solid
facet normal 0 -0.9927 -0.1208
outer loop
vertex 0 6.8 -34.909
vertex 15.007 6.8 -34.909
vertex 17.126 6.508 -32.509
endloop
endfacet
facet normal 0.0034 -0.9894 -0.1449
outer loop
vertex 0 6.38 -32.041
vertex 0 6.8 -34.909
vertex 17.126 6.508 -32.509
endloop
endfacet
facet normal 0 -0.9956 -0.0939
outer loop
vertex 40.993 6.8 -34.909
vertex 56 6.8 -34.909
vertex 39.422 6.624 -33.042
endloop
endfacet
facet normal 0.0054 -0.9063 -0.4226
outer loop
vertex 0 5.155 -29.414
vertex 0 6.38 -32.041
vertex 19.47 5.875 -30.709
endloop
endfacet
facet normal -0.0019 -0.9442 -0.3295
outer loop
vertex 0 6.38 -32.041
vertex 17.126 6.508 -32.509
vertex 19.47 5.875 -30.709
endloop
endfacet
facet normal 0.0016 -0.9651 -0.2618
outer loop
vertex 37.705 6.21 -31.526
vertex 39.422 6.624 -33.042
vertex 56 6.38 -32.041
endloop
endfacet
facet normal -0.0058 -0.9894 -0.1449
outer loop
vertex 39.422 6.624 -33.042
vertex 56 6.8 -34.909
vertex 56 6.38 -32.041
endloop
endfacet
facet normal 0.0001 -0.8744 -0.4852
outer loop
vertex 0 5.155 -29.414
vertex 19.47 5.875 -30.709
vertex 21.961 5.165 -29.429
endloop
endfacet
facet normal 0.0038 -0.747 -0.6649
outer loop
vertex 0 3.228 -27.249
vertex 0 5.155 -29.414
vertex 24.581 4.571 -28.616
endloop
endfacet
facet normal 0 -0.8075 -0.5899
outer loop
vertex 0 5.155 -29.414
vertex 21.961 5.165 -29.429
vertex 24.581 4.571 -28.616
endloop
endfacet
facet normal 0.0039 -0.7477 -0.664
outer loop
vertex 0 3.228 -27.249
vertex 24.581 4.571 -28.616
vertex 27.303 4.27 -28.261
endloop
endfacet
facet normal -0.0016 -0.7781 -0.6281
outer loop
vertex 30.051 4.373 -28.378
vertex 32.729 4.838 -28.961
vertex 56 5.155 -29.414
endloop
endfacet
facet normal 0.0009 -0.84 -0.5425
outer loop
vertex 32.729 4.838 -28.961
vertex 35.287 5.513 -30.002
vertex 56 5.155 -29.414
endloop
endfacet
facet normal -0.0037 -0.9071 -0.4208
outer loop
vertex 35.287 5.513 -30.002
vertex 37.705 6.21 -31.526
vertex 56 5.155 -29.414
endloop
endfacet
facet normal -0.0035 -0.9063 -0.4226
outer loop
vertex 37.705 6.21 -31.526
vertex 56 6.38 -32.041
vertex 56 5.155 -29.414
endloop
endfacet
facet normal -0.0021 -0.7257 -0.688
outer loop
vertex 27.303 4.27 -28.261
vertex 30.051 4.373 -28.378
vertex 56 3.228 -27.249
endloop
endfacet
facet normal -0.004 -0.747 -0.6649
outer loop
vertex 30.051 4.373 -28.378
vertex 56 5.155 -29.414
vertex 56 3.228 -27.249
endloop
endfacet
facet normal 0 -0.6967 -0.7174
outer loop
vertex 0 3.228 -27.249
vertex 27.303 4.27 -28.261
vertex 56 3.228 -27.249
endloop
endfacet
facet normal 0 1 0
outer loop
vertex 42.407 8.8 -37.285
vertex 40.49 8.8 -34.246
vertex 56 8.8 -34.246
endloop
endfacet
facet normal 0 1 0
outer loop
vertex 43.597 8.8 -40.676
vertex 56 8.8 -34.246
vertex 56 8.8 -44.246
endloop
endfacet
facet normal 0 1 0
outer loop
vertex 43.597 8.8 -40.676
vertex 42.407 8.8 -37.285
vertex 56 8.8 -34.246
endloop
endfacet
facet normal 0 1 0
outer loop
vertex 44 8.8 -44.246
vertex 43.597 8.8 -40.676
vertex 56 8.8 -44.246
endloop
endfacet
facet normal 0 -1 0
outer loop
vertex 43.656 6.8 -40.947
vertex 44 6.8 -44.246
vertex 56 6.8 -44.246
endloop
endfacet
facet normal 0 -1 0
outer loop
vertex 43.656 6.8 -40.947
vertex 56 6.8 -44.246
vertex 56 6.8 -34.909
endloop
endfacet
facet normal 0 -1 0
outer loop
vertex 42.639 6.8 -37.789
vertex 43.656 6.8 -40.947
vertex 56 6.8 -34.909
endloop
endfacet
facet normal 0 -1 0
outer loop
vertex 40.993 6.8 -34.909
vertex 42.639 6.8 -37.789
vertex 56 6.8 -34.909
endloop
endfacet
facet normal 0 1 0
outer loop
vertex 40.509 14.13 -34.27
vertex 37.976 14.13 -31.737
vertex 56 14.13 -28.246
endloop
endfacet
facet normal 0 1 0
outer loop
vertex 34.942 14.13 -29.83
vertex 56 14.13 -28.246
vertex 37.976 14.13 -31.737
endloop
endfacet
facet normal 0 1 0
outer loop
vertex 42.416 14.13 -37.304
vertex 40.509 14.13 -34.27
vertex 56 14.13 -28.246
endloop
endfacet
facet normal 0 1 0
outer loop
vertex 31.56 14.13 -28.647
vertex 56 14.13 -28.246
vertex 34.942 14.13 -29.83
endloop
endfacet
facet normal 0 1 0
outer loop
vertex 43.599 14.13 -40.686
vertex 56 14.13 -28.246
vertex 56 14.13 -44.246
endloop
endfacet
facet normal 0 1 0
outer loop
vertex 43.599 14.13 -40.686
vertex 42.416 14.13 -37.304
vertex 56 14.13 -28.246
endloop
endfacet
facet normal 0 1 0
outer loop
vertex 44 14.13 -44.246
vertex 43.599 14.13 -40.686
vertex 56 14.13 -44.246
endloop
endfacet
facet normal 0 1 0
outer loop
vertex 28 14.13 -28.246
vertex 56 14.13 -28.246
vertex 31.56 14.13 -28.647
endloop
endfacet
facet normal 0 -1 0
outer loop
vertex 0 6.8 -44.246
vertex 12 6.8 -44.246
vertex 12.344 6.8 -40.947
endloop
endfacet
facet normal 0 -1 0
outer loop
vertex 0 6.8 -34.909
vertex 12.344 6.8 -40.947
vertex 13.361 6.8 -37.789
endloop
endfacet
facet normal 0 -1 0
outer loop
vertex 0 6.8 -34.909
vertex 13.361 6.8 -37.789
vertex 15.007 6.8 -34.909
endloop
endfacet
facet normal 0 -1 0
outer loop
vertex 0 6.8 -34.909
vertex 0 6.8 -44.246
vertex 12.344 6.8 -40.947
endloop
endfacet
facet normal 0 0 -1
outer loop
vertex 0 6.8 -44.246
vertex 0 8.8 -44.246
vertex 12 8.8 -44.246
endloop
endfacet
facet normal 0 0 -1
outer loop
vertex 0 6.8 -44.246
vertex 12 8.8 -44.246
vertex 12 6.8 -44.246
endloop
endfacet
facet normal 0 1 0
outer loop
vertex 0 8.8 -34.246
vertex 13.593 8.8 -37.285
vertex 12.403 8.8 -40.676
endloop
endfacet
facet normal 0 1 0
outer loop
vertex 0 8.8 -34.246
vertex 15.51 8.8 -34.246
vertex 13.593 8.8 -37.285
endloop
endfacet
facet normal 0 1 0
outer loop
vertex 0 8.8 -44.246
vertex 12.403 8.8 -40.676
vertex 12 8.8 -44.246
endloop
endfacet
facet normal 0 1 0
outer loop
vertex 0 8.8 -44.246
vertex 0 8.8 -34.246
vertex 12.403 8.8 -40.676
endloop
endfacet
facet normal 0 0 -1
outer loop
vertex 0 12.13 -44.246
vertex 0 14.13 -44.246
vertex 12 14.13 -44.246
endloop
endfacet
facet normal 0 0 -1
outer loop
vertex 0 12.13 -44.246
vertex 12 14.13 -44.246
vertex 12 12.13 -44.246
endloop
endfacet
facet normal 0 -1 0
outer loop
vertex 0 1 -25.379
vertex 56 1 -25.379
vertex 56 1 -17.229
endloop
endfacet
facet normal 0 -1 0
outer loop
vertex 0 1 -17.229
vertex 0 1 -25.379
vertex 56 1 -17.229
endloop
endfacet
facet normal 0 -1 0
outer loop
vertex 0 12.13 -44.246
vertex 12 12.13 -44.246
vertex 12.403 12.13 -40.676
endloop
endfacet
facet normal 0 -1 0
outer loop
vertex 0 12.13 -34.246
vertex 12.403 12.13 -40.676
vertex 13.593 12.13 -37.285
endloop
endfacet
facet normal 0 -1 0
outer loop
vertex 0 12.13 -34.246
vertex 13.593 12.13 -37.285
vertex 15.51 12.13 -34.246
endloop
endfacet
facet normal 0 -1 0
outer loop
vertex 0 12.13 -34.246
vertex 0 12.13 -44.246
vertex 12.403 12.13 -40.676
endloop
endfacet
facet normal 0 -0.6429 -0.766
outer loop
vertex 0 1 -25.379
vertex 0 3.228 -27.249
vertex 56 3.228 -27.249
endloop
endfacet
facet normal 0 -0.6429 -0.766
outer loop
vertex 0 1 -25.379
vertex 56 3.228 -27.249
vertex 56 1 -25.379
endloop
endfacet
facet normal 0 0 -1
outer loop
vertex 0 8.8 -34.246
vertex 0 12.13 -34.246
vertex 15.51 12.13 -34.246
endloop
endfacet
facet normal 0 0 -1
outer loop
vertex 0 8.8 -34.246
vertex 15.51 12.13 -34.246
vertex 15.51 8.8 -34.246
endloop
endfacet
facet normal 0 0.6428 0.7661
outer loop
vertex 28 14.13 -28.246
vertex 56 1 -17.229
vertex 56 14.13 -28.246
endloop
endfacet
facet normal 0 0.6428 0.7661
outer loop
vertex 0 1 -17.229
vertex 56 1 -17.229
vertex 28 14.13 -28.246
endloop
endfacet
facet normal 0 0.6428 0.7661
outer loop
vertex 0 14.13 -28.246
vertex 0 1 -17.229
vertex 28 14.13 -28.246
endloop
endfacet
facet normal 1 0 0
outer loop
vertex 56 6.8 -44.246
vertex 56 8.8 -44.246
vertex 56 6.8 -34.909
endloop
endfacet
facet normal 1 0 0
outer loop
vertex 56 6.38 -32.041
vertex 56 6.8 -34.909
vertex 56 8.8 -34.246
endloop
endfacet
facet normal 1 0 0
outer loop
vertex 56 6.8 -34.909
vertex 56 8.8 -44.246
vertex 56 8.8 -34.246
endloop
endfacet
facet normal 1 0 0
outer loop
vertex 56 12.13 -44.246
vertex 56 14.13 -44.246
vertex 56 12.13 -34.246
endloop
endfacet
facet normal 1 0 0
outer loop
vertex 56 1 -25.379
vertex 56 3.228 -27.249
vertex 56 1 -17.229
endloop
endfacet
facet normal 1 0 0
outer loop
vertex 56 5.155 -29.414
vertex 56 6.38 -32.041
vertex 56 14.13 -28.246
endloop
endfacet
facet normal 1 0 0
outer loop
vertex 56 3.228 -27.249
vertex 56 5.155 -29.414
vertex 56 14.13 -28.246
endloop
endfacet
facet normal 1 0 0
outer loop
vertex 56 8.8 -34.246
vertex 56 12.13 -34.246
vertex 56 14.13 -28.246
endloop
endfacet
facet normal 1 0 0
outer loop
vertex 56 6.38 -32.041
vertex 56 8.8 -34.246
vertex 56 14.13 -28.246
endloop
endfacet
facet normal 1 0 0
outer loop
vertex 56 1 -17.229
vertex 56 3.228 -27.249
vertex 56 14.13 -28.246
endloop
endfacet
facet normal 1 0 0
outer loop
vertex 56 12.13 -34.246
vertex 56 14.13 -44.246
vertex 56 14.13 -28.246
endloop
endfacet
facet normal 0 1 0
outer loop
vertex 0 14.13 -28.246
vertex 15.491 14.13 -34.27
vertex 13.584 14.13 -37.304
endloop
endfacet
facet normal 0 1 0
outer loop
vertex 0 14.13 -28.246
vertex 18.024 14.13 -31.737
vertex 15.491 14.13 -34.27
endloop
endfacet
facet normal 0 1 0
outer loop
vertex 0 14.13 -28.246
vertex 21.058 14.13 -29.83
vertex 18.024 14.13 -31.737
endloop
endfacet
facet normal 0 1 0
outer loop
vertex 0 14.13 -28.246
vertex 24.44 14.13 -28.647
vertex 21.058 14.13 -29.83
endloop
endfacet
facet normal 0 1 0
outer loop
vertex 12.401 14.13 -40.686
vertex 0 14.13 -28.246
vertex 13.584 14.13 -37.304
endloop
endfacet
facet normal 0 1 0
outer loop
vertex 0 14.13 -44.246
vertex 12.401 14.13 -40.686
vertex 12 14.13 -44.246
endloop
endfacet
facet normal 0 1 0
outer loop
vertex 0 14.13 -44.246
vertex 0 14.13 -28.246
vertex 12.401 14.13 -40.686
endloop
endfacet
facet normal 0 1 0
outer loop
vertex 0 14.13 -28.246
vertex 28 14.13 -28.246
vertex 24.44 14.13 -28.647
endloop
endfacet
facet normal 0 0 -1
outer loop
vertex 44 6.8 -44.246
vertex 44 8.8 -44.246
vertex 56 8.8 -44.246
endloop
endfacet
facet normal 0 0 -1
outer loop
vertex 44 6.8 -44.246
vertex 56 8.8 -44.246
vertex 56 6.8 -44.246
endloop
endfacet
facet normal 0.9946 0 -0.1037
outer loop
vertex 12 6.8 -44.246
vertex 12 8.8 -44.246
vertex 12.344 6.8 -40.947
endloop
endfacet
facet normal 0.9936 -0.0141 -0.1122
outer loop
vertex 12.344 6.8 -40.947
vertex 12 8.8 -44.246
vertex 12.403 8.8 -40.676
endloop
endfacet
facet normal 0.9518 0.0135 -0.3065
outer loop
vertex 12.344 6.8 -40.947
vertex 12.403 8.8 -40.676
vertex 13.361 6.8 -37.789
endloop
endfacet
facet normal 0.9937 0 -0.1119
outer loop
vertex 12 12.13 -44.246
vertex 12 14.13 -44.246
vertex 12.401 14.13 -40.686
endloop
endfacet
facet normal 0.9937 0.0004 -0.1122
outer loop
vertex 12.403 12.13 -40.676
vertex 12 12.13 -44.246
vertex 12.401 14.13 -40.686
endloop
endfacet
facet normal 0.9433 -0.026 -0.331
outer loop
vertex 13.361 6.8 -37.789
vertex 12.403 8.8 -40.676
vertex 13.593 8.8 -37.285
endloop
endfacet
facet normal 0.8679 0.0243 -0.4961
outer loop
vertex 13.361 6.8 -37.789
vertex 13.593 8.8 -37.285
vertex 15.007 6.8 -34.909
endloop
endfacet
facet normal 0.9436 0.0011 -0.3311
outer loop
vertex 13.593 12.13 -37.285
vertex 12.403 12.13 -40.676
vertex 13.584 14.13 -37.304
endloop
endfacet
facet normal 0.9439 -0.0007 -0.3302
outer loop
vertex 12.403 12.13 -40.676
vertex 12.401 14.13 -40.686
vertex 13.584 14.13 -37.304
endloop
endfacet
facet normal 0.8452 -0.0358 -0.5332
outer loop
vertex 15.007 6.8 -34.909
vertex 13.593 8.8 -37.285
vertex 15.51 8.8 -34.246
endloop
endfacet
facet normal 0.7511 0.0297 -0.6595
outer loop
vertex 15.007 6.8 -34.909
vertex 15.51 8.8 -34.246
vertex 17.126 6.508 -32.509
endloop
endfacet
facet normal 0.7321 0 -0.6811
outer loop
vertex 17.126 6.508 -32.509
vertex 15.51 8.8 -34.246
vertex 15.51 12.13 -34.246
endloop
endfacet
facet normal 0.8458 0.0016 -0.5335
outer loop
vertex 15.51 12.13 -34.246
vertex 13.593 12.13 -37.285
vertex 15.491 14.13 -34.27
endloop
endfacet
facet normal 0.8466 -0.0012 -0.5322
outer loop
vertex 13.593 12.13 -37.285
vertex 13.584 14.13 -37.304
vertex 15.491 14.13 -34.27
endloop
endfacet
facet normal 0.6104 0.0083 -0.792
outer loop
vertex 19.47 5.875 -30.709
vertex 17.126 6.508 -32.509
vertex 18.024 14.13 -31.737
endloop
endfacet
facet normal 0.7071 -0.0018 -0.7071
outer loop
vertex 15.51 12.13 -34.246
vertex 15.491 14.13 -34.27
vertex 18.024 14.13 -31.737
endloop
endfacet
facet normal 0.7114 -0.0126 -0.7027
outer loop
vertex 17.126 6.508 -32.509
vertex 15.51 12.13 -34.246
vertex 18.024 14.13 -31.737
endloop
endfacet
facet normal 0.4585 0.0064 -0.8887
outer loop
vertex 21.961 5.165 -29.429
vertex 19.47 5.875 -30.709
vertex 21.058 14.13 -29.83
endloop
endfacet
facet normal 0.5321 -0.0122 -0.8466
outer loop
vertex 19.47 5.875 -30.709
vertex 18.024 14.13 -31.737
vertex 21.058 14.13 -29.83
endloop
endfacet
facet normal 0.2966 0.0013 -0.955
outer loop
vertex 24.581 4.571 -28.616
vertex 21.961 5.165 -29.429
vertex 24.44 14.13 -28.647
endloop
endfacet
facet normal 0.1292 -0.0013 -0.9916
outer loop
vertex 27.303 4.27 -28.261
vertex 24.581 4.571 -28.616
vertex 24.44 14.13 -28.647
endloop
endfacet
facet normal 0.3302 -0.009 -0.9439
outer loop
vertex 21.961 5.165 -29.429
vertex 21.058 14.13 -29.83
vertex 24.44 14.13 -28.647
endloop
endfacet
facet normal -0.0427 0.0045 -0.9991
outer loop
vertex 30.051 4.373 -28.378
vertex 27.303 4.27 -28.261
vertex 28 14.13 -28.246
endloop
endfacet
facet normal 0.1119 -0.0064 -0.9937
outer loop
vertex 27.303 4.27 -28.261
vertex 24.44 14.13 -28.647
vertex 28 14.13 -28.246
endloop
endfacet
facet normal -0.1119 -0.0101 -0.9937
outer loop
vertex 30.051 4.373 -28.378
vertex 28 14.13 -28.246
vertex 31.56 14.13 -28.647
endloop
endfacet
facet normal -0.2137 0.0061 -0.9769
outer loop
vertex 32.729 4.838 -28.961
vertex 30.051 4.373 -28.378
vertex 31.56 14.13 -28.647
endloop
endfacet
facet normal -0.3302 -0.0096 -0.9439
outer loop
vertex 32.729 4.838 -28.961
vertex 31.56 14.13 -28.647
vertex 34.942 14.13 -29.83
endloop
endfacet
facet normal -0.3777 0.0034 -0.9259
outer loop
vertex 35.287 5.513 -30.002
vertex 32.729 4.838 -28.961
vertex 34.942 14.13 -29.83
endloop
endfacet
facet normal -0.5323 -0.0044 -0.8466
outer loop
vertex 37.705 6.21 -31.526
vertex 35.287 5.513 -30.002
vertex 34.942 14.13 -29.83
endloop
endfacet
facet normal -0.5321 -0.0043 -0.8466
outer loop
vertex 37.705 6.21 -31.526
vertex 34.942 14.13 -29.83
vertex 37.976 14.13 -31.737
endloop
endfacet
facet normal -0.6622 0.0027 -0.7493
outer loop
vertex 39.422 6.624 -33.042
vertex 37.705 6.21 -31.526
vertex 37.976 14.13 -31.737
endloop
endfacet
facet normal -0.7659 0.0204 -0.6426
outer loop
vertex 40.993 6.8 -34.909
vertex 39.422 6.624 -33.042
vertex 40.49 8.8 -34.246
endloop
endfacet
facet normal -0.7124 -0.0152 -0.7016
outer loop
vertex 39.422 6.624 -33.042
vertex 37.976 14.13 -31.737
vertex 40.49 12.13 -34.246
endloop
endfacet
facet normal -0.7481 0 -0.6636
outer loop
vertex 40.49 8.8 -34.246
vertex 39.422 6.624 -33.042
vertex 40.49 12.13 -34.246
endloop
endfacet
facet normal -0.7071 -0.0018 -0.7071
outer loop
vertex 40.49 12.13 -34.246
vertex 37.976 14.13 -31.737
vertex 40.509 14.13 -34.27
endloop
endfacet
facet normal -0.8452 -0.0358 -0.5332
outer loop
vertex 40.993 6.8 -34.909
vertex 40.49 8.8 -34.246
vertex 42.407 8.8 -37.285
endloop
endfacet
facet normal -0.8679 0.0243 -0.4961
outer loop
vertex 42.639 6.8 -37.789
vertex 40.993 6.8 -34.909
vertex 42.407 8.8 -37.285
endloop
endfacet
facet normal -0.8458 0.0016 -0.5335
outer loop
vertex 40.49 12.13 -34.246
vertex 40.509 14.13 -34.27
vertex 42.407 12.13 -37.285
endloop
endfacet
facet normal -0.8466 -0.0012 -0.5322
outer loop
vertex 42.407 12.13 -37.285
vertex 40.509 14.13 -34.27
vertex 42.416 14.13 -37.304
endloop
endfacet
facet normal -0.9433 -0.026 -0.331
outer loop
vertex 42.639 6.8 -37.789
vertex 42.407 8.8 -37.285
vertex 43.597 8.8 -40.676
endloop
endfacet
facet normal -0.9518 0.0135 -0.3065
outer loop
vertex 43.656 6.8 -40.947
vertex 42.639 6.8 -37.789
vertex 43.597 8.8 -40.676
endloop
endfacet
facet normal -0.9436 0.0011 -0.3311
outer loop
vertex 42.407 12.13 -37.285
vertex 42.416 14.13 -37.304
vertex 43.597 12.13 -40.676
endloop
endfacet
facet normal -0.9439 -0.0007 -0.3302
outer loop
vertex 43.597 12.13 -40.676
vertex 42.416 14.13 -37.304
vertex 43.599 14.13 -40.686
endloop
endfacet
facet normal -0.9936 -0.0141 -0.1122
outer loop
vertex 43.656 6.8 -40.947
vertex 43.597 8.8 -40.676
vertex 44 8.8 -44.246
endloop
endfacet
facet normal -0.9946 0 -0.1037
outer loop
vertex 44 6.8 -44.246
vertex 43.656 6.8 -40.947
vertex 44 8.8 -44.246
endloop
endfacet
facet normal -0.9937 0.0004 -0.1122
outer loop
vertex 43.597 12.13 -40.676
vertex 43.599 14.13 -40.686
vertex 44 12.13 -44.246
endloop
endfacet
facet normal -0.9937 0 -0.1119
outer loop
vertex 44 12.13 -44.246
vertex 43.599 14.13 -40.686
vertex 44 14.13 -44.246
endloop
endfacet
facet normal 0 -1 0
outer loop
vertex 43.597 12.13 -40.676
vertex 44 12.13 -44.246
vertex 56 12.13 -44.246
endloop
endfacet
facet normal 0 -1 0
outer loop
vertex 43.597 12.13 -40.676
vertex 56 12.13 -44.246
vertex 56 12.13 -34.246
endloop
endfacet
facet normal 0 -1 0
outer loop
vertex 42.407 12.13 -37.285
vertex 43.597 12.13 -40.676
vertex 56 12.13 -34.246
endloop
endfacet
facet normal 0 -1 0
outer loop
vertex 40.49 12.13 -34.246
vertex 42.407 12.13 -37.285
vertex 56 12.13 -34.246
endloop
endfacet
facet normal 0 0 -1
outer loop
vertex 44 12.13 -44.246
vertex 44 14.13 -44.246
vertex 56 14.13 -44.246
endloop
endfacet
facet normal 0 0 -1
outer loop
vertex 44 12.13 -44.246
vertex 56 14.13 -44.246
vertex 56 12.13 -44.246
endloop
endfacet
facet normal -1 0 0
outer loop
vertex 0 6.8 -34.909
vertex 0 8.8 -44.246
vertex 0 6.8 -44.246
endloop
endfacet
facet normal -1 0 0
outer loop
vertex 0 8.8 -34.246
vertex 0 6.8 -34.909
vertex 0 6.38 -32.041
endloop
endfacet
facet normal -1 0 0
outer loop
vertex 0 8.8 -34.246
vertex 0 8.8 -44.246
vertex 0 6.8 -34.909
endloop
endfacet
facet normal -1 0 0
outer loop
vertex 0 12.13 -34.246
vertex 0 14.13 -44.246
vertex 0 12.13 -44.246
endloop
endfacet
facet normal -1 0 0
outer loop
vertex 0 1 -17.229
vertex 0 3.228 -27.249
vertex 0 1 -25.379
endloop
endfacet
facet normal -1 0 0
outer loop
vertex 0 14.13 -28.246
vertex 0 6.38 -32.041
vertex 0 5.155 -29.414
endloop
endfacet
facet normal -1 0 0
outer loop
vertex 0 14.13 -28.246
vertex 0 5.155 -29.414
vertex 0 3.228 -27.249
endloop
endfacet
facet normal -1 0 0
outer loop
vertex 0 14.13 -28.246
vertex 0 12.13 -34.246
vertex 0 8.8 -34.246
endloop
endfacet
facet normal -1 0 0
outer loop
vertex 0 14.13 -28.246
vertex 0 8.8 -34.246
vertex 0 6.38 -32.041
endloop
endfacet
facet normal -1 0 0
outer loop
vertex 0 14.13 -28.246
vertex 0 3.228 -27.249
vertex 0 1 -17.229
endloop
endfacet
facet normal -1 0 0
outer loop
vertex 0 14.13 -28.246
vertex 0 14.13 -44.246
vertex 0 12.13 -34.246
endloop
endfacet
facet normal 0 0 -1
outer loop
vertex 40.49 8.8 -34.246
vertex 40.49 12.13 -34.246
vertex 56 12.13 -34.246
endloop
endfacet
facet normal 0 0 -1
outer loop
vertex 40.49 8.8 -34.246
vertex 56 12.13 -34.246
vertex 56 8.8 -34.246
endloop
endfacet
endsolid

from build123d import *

# Parameters (mm, degrees)
BOSS_EXTRUDE1_DEPTH = 56
FILLET1_R           = 10
SKETCH15_R          = 16
CUT_EXTRUDE1_DEPTH  = 73.567889266


with BuildPart() as part:
    # Sketch1 → Boss-Extrude1 (new body)
    with BuildSketch(Plane(origin=(0, 0, 0), x_dir=(0, 0, -1), z_dir=(1, 0, 0))):
        Polygon((44.245922439, 12.13), (34.245922439, 12.13), (34.245922439, 8.8), (44.245922439, 8.8), (44.245922439, 6.8), (30.245922439, 6.8), (25.379144578, 1), (17.228544282, 1), (28.245922439, 14.13), (44.245922439, 14.13), align=None)
    extrude(amount=BOSS_EXTRUDE1_DEPTH)

    # Fillet1
    fillet1_edges = [part.edges().sort_by_distance(p)[0] for p in [
        (28, 6.8, -30.245922439),
    ]]
    fillet(fillet1_edges, radius=FILLET1_R)

    # Sketch15 → Cut-Extrude1 (cut, through all)
    with BuildSketch(Plane(origin=(0, 14.13, 0), x_dir=(1, 0, 0), z_dir=(0, 1, 0))):
        with Locations((28, 44.245922439)):
            Circle(SKETCH15_R)
    extrude(amount=-CUT_EXTRUDE1_DEPTH, mode=Mode.SUBTRACT)


solid = part.part
